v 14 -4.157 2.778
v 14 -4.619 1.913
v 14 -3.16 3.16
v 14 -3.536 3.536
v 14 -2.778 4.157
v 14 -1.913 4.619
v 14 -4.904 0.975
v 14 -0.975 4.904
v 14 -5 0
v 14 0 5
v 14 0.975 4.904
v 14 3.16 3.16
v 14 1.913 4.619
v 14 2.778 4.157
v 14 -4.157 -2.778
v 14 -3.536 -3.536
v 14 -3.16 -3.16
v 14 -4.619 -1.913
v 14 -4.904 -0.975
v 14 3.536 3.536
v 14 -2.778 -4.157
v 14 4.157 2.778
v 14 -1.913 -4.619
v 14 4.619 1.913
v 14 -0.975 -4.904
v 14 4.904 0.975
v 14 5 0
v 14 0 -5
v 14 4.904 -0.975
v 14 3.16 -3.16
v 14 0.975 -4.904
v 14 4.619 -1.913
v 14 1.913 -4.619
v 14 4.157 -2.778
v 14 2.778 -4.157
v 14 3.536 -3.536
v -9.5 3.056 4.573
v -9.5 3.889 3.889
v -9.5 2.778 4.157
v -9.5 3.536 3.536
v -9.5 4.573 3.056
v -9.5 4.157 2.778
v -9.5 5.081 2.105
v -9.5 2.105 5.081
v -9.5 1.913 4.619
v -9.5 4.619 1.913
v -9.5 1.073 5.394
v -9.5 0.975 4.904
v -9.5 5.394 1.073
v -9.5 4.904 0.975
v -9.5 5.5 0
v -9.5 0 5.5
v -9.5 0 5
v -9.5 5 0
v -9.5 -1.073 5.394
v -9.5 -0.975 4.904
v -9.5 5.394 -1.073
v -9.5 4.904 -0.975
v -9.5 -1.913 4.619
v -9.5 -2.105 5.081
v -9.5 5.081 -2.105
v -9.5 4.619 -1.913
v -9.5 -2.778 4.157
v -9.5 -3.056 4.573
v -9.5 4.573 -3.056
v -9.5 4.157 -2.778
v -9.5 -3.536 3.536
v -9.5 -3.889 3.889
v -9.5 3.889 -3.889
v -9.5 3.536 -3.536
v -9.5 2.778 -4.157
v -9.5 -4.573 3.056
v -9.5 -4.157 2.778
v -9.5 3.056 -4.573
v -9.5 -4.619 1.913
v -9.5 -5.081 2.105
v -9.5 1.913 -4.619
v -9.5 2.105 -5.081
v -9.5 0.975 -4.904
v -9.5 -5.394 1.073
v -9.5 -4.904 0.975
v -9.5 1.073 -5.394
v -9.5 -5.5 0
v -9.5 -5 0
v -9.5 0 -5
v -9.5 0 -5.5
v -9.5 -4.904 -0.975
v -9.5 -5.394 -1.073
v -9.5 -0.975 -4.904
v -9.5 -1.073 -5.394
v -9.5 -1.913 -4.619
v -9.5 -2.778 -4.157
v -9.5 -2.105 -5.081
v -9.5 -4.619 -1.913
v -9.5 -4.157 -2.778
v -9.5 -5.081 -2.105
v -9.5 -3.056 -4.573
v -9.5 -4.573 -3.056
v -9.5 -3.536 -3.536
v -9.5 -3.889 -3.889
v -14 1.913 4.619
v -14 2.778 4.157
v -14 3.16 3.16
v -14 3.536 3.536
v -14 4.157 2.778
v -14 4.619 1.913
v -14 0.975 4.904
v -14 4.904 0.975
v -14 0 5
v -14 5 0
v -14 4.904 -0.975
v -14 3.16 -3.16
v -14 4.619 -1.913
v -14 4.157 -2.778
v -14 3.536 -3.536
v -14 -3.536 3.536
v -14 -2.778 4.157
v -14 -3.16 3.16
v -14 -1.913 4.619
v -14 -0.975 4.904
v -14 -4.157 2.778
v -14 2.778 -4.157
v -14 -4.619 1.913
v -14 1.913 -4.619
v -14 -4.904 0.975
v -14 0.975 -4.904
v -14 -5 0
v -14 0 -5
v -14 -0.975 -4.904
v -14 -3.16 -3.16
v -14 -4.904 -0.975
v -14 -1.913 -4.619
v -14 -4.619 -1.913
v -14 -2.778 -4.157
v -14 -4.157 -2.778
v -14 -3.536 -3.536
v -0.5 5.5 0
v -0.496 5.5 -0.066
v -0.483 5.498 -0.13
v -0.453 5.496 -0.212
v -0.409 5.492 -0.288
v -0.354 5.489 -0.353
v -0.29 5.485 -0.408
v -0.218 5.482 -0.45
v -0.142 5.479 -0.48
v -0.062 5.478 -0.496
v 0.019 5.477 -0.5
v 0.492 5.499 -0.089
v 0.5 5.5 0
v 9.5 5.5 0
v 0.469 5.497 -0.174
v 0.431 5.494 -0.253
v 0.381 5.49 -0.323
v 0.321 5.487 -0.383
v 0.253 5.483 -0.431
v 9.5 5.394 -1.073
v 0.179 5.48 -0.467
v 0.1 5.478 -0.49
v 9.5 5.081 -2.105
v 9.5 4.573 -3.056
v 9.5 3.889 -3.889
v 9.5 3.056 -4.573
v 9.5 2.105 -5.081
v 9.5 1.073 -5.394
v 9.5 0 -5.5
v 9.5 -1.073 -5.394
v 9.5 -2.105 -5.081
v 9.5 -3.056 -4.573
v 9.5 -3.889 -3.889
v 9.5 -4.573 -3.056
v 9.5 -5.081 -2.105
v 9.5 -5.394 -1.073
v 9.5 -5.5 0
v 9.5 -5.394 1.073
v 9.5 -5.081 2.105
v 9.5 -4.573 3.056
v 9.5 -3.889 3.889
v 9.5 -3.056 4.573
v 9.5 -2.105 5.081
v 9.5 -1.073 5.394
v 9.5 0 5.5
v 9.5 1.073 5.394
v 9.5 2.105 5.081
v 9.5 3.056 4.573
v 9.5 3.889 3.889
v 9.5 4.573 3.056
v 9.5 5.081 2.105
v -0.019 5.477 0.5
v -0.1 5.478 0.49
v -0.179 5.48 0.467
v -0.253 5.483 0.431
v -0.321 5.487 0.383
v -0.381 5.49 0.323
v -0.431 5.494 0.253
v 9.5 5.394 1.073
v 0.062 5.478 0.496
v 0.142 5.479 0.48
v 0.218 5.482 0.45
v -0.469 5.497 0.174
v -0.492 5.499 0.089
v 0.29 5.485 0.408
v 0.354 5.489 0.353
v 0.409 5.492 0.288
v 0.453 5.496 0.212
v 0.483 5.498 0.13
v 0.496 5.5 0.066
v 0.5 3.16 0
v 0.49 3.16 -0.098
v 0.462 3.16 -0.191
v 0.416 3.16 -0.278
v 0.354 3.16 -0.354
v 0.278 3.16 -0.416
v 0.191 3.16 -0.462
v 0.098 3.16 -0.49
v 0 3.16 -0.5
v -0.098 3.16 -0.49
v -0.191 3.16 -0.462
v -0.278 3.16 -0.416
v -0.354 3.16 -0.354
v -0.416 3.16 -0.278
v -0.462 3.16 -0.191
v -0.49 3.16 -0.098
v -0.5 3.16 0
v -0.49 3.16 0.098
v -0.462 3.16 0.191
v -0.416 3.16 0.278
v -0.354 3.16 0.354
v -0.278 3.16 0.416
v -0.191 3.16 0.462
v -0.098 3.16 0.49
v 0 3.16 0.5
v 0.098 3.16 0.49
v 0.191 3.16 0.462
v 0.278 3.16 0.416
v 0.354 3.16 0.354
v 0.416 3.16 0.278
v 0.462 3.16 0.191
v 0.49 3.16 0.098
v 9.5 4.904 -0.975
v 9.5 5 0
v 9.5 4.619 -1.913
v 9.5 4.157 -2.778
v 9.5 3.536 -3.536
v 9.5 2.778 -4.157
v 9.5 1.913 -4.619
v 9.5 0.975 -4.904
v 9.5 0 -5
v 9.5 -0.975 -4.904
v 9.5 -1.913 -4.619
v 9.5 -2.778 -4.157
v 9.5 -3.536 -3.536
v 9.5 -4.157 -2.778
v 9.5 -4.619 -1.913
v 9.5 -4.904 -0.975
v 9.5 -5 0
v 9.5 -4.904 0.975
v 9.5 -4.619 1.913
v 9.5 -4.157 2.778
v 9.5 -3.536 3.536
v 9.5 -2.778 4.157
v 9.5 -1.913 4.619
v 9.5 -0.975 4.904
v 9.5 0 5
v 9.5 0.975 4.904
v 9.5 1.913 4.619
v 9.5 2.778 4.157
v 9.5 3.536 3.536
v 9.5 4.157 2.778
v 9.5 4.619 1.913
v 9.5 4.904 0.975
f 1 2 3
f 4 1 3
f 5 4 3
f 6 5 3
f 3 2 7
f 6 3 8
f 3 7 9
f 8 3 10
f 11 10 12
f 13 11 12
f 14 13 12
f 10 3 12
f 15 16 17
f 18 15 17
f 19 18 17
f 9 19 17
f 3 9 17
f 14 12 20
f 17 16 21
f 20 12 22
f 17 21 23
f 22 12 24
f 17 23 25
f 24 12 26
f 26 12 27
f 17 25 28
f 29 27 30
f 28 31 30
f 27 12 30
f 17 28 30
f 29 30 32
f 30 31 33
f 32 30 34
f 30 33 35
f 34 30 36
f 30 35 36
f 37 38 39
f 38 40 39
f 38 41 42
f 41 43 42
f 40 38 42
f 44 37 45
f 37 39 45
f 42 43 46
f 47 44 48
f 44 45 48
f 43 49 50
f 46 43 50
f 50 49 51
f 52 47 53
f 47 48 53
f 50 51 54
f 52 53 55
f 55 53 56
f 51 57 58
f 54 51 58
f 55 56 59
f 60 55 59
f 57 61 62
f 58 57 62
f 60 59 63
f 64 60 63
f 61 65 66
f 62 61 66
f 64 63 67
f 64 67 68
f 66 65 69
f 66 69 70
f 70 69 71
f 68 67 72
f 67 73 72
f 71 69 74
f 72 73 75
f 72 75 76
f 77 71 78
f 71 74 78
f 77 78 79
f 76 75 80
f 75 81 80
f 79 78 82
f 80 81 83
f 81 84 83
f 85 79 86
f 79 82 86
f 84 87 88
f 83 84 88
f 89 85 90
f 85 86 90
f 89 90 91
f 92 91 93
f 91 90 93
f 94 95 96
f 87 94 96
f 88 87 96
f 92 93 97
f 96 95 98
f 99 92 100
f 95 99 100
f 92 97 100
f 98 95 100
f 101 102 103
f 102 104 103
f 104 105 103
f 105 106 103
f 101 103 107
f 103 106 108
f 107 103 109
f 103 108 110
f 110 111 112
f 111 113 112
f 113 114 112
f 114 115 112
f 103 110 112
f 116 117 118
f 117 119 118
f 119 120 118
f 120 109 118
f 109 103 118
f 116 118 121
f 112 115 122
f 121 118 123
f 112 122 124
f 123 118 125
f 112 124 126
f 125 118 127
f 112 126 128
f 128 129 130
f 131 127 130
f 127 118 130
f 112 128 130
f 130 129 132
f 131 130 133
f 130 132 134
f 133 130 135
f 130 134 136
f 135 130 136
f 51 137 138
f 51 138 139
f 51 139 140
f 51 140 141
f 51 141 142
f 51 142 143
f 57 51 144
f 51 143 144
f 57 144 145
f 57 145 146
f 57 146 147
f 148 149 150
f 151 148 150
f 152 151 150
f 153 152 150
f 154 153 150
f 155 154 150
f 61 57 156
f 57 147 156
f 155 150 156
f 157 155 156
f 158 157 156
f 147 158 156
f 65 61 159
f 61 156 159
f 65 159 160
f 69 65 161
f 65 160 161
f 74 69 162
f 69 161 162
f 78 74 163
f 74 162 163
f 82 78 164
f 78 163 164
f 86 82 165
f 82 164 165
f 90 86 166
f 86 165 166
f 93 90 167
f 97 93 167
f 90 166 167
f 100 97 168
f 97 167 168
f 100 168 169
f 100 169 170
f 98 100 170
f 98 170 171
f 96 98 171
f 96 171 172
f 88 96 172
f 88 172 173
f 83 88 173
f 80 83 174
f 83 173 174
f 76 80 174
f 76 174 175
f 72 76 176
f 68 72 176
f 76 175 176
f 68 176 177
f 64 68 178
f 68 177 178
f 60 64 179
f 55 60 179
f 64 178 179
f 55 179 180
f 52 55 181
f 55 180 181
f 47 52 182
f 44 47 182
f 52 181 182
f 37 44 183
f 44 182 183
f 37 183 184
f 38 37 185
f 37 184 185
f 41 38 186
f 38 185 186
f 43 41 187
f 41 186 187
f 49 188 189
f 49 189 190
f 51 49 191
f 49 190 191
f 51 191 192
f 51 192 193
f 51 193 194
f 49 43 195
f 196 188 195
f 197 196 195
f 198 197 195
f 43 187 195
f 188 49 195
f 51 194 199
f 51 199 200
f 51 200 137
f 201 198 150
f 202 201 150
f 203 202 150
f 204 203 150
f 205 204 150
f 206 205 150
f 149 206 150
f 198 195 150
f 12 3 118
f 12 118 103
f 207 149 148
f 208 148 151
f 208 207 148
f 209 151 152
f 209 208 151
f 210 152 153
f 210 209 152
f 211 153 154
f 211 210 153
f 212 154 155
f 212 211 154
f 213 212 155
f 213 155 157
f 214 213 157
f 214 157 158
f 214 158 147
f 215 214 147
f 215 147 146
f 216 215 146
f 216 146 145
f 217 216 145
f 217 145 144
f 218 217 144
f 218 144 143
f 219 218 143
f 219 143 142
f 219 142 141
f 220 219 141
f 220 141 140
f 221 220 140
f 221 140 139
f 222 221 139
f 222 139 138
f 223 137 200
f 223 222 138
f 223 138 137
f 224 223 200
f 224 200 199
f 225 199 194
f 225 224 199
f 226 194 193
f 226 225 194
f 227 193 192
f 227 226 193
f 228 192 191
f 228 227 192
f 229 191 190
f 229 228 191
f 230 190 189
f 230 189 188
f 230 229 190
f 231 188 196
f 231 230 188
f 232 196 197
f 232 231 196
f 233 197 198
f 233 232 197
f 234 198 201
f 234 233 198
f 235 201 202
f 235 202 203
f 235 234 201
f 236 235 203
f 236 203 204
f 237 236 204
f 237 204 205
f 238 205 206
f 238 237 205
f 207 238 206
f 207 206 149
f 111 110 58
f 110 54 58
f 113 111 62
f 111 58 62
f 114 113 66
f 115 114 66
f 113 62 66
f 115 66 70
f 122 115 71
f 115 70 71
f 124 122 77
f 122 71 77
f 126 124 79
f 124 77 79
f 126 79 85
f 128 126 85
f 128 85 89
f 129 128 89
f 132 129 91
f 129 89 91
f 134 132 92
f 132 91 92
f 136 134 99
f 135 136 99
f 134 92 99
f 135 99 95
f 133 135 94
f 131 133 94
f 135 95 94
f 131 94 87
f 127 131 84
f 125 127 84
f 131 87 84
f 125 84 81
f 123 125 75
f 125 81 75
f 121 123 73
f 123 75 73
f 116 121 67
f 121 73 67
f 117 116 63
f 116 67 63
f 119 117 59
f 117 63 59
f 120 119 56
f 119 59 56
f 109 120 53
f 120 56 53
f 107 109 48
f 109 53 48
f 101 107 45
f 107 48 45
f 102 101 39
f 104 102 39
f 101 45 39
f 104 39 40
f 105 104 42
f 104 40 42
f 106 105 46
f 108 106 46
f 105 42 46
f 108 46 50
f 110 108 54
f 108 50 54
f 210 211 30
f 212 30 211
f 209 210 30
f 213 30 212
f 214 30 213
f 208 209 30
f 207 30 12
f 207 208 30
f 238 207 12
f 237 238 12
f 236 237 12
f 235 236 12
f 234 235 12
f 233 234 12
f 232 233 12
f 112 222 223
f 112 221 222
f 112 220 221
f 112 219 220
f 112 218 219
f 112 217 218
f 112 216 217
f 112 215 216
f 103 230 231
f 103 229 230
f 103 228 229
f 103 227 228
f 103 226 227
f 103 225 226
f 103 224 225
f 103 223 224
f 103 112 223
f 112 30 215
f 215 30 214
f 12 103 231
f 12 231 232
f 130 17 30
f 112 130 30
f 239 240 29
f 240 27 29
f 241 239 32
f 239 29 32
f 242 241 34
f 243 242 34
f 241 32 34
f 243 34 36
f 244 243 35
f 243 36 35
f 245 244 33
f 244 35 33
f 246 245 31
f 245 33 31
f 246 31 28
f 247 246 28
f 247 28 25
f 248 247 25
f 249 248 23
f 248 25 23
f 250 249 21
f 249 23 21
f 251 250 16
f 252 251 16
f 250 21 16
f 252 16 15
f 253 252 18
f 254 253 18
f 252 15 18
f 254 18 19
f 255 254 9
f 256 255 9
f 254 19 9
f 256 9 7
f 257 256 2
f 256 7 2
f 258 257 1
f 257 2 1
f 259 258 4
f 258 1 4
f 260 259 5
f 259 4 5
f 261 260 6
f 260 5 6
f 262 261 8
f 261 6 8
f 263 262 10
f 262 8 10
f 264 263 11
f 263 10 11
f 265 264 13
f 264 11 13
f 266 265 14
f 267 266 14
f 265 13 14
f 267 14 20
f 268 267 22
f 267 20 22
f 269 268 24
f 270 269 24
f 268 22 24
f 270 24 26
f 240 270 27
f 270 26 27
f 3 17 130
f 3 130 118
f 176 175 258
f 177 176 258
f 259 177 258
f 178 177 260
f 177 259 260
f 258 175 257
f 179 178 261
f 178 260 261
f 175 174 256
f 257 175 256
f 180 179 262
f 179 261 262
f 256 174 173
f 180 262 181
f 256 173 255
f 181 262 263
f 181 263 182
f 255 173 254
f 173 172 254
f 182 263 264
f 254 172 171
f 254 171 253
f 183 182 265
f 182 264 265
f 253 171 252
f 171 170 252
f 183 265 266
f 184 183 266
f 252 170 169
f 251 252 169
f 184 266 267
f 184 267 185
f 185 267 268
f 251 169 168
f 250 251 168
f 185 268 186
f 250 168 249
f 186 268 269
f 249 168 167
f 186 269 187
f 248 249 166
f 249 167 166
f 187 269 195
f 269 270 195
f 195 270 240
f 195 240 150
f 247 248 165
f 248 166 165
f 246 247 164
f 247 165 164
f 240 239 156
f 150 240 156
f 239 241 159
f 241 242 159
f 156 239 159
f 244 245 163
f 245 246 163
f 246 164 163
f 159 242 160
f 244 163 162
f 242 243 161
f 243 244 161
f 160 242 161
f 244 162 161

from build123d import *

# Parameters (mm, degrees)
SKETCH2_W          = 6.32
SKETCH2_H          = 6.32
CUT_EXTRUDE1_DEPTH = 29
SKETCH3_R          = 0.5
CUT_EXTRUDE2_DEPTH = 6.5


with BuildPart() as part:
    # Sketch1 → Revolve1 (revolve)
    with BuildSketch(Plane.XY):
        Polygon((-9.5, 5.5), (9.5, 5.5), (9.5, 5), (14, 5), (14, 0), (-14, 0), (-14, 5), (-9.5, 5), align=None)
    revolve(axis=Axis((0, 0, 0), (-1, 0, 0)))

    # Sketch2 → Cut-Extrude1 (cut, through all)
    with BuildSketch(Plane.ZY.offset(14)):
        Rectangle(SKETCH2_W, SKETCH2_H)
    extrude(amount=-CUT_EXTRUDE1_DEPTH, mode=Mode.SUBTRACT)

    # Sketch3 → Cut-Extrude2 (cut, through all)
    with BuildSketch(Plane(origin=(0, 0, 0), x_dir=(1, 0, 0), z_dir=(0, 1, 0))):
        Circle(SKETCH3_R)
    extrude(amount=CUT_EXTRUDE2_DEPTH, mode=Mode.SUBTRACT)


solid = part.part
